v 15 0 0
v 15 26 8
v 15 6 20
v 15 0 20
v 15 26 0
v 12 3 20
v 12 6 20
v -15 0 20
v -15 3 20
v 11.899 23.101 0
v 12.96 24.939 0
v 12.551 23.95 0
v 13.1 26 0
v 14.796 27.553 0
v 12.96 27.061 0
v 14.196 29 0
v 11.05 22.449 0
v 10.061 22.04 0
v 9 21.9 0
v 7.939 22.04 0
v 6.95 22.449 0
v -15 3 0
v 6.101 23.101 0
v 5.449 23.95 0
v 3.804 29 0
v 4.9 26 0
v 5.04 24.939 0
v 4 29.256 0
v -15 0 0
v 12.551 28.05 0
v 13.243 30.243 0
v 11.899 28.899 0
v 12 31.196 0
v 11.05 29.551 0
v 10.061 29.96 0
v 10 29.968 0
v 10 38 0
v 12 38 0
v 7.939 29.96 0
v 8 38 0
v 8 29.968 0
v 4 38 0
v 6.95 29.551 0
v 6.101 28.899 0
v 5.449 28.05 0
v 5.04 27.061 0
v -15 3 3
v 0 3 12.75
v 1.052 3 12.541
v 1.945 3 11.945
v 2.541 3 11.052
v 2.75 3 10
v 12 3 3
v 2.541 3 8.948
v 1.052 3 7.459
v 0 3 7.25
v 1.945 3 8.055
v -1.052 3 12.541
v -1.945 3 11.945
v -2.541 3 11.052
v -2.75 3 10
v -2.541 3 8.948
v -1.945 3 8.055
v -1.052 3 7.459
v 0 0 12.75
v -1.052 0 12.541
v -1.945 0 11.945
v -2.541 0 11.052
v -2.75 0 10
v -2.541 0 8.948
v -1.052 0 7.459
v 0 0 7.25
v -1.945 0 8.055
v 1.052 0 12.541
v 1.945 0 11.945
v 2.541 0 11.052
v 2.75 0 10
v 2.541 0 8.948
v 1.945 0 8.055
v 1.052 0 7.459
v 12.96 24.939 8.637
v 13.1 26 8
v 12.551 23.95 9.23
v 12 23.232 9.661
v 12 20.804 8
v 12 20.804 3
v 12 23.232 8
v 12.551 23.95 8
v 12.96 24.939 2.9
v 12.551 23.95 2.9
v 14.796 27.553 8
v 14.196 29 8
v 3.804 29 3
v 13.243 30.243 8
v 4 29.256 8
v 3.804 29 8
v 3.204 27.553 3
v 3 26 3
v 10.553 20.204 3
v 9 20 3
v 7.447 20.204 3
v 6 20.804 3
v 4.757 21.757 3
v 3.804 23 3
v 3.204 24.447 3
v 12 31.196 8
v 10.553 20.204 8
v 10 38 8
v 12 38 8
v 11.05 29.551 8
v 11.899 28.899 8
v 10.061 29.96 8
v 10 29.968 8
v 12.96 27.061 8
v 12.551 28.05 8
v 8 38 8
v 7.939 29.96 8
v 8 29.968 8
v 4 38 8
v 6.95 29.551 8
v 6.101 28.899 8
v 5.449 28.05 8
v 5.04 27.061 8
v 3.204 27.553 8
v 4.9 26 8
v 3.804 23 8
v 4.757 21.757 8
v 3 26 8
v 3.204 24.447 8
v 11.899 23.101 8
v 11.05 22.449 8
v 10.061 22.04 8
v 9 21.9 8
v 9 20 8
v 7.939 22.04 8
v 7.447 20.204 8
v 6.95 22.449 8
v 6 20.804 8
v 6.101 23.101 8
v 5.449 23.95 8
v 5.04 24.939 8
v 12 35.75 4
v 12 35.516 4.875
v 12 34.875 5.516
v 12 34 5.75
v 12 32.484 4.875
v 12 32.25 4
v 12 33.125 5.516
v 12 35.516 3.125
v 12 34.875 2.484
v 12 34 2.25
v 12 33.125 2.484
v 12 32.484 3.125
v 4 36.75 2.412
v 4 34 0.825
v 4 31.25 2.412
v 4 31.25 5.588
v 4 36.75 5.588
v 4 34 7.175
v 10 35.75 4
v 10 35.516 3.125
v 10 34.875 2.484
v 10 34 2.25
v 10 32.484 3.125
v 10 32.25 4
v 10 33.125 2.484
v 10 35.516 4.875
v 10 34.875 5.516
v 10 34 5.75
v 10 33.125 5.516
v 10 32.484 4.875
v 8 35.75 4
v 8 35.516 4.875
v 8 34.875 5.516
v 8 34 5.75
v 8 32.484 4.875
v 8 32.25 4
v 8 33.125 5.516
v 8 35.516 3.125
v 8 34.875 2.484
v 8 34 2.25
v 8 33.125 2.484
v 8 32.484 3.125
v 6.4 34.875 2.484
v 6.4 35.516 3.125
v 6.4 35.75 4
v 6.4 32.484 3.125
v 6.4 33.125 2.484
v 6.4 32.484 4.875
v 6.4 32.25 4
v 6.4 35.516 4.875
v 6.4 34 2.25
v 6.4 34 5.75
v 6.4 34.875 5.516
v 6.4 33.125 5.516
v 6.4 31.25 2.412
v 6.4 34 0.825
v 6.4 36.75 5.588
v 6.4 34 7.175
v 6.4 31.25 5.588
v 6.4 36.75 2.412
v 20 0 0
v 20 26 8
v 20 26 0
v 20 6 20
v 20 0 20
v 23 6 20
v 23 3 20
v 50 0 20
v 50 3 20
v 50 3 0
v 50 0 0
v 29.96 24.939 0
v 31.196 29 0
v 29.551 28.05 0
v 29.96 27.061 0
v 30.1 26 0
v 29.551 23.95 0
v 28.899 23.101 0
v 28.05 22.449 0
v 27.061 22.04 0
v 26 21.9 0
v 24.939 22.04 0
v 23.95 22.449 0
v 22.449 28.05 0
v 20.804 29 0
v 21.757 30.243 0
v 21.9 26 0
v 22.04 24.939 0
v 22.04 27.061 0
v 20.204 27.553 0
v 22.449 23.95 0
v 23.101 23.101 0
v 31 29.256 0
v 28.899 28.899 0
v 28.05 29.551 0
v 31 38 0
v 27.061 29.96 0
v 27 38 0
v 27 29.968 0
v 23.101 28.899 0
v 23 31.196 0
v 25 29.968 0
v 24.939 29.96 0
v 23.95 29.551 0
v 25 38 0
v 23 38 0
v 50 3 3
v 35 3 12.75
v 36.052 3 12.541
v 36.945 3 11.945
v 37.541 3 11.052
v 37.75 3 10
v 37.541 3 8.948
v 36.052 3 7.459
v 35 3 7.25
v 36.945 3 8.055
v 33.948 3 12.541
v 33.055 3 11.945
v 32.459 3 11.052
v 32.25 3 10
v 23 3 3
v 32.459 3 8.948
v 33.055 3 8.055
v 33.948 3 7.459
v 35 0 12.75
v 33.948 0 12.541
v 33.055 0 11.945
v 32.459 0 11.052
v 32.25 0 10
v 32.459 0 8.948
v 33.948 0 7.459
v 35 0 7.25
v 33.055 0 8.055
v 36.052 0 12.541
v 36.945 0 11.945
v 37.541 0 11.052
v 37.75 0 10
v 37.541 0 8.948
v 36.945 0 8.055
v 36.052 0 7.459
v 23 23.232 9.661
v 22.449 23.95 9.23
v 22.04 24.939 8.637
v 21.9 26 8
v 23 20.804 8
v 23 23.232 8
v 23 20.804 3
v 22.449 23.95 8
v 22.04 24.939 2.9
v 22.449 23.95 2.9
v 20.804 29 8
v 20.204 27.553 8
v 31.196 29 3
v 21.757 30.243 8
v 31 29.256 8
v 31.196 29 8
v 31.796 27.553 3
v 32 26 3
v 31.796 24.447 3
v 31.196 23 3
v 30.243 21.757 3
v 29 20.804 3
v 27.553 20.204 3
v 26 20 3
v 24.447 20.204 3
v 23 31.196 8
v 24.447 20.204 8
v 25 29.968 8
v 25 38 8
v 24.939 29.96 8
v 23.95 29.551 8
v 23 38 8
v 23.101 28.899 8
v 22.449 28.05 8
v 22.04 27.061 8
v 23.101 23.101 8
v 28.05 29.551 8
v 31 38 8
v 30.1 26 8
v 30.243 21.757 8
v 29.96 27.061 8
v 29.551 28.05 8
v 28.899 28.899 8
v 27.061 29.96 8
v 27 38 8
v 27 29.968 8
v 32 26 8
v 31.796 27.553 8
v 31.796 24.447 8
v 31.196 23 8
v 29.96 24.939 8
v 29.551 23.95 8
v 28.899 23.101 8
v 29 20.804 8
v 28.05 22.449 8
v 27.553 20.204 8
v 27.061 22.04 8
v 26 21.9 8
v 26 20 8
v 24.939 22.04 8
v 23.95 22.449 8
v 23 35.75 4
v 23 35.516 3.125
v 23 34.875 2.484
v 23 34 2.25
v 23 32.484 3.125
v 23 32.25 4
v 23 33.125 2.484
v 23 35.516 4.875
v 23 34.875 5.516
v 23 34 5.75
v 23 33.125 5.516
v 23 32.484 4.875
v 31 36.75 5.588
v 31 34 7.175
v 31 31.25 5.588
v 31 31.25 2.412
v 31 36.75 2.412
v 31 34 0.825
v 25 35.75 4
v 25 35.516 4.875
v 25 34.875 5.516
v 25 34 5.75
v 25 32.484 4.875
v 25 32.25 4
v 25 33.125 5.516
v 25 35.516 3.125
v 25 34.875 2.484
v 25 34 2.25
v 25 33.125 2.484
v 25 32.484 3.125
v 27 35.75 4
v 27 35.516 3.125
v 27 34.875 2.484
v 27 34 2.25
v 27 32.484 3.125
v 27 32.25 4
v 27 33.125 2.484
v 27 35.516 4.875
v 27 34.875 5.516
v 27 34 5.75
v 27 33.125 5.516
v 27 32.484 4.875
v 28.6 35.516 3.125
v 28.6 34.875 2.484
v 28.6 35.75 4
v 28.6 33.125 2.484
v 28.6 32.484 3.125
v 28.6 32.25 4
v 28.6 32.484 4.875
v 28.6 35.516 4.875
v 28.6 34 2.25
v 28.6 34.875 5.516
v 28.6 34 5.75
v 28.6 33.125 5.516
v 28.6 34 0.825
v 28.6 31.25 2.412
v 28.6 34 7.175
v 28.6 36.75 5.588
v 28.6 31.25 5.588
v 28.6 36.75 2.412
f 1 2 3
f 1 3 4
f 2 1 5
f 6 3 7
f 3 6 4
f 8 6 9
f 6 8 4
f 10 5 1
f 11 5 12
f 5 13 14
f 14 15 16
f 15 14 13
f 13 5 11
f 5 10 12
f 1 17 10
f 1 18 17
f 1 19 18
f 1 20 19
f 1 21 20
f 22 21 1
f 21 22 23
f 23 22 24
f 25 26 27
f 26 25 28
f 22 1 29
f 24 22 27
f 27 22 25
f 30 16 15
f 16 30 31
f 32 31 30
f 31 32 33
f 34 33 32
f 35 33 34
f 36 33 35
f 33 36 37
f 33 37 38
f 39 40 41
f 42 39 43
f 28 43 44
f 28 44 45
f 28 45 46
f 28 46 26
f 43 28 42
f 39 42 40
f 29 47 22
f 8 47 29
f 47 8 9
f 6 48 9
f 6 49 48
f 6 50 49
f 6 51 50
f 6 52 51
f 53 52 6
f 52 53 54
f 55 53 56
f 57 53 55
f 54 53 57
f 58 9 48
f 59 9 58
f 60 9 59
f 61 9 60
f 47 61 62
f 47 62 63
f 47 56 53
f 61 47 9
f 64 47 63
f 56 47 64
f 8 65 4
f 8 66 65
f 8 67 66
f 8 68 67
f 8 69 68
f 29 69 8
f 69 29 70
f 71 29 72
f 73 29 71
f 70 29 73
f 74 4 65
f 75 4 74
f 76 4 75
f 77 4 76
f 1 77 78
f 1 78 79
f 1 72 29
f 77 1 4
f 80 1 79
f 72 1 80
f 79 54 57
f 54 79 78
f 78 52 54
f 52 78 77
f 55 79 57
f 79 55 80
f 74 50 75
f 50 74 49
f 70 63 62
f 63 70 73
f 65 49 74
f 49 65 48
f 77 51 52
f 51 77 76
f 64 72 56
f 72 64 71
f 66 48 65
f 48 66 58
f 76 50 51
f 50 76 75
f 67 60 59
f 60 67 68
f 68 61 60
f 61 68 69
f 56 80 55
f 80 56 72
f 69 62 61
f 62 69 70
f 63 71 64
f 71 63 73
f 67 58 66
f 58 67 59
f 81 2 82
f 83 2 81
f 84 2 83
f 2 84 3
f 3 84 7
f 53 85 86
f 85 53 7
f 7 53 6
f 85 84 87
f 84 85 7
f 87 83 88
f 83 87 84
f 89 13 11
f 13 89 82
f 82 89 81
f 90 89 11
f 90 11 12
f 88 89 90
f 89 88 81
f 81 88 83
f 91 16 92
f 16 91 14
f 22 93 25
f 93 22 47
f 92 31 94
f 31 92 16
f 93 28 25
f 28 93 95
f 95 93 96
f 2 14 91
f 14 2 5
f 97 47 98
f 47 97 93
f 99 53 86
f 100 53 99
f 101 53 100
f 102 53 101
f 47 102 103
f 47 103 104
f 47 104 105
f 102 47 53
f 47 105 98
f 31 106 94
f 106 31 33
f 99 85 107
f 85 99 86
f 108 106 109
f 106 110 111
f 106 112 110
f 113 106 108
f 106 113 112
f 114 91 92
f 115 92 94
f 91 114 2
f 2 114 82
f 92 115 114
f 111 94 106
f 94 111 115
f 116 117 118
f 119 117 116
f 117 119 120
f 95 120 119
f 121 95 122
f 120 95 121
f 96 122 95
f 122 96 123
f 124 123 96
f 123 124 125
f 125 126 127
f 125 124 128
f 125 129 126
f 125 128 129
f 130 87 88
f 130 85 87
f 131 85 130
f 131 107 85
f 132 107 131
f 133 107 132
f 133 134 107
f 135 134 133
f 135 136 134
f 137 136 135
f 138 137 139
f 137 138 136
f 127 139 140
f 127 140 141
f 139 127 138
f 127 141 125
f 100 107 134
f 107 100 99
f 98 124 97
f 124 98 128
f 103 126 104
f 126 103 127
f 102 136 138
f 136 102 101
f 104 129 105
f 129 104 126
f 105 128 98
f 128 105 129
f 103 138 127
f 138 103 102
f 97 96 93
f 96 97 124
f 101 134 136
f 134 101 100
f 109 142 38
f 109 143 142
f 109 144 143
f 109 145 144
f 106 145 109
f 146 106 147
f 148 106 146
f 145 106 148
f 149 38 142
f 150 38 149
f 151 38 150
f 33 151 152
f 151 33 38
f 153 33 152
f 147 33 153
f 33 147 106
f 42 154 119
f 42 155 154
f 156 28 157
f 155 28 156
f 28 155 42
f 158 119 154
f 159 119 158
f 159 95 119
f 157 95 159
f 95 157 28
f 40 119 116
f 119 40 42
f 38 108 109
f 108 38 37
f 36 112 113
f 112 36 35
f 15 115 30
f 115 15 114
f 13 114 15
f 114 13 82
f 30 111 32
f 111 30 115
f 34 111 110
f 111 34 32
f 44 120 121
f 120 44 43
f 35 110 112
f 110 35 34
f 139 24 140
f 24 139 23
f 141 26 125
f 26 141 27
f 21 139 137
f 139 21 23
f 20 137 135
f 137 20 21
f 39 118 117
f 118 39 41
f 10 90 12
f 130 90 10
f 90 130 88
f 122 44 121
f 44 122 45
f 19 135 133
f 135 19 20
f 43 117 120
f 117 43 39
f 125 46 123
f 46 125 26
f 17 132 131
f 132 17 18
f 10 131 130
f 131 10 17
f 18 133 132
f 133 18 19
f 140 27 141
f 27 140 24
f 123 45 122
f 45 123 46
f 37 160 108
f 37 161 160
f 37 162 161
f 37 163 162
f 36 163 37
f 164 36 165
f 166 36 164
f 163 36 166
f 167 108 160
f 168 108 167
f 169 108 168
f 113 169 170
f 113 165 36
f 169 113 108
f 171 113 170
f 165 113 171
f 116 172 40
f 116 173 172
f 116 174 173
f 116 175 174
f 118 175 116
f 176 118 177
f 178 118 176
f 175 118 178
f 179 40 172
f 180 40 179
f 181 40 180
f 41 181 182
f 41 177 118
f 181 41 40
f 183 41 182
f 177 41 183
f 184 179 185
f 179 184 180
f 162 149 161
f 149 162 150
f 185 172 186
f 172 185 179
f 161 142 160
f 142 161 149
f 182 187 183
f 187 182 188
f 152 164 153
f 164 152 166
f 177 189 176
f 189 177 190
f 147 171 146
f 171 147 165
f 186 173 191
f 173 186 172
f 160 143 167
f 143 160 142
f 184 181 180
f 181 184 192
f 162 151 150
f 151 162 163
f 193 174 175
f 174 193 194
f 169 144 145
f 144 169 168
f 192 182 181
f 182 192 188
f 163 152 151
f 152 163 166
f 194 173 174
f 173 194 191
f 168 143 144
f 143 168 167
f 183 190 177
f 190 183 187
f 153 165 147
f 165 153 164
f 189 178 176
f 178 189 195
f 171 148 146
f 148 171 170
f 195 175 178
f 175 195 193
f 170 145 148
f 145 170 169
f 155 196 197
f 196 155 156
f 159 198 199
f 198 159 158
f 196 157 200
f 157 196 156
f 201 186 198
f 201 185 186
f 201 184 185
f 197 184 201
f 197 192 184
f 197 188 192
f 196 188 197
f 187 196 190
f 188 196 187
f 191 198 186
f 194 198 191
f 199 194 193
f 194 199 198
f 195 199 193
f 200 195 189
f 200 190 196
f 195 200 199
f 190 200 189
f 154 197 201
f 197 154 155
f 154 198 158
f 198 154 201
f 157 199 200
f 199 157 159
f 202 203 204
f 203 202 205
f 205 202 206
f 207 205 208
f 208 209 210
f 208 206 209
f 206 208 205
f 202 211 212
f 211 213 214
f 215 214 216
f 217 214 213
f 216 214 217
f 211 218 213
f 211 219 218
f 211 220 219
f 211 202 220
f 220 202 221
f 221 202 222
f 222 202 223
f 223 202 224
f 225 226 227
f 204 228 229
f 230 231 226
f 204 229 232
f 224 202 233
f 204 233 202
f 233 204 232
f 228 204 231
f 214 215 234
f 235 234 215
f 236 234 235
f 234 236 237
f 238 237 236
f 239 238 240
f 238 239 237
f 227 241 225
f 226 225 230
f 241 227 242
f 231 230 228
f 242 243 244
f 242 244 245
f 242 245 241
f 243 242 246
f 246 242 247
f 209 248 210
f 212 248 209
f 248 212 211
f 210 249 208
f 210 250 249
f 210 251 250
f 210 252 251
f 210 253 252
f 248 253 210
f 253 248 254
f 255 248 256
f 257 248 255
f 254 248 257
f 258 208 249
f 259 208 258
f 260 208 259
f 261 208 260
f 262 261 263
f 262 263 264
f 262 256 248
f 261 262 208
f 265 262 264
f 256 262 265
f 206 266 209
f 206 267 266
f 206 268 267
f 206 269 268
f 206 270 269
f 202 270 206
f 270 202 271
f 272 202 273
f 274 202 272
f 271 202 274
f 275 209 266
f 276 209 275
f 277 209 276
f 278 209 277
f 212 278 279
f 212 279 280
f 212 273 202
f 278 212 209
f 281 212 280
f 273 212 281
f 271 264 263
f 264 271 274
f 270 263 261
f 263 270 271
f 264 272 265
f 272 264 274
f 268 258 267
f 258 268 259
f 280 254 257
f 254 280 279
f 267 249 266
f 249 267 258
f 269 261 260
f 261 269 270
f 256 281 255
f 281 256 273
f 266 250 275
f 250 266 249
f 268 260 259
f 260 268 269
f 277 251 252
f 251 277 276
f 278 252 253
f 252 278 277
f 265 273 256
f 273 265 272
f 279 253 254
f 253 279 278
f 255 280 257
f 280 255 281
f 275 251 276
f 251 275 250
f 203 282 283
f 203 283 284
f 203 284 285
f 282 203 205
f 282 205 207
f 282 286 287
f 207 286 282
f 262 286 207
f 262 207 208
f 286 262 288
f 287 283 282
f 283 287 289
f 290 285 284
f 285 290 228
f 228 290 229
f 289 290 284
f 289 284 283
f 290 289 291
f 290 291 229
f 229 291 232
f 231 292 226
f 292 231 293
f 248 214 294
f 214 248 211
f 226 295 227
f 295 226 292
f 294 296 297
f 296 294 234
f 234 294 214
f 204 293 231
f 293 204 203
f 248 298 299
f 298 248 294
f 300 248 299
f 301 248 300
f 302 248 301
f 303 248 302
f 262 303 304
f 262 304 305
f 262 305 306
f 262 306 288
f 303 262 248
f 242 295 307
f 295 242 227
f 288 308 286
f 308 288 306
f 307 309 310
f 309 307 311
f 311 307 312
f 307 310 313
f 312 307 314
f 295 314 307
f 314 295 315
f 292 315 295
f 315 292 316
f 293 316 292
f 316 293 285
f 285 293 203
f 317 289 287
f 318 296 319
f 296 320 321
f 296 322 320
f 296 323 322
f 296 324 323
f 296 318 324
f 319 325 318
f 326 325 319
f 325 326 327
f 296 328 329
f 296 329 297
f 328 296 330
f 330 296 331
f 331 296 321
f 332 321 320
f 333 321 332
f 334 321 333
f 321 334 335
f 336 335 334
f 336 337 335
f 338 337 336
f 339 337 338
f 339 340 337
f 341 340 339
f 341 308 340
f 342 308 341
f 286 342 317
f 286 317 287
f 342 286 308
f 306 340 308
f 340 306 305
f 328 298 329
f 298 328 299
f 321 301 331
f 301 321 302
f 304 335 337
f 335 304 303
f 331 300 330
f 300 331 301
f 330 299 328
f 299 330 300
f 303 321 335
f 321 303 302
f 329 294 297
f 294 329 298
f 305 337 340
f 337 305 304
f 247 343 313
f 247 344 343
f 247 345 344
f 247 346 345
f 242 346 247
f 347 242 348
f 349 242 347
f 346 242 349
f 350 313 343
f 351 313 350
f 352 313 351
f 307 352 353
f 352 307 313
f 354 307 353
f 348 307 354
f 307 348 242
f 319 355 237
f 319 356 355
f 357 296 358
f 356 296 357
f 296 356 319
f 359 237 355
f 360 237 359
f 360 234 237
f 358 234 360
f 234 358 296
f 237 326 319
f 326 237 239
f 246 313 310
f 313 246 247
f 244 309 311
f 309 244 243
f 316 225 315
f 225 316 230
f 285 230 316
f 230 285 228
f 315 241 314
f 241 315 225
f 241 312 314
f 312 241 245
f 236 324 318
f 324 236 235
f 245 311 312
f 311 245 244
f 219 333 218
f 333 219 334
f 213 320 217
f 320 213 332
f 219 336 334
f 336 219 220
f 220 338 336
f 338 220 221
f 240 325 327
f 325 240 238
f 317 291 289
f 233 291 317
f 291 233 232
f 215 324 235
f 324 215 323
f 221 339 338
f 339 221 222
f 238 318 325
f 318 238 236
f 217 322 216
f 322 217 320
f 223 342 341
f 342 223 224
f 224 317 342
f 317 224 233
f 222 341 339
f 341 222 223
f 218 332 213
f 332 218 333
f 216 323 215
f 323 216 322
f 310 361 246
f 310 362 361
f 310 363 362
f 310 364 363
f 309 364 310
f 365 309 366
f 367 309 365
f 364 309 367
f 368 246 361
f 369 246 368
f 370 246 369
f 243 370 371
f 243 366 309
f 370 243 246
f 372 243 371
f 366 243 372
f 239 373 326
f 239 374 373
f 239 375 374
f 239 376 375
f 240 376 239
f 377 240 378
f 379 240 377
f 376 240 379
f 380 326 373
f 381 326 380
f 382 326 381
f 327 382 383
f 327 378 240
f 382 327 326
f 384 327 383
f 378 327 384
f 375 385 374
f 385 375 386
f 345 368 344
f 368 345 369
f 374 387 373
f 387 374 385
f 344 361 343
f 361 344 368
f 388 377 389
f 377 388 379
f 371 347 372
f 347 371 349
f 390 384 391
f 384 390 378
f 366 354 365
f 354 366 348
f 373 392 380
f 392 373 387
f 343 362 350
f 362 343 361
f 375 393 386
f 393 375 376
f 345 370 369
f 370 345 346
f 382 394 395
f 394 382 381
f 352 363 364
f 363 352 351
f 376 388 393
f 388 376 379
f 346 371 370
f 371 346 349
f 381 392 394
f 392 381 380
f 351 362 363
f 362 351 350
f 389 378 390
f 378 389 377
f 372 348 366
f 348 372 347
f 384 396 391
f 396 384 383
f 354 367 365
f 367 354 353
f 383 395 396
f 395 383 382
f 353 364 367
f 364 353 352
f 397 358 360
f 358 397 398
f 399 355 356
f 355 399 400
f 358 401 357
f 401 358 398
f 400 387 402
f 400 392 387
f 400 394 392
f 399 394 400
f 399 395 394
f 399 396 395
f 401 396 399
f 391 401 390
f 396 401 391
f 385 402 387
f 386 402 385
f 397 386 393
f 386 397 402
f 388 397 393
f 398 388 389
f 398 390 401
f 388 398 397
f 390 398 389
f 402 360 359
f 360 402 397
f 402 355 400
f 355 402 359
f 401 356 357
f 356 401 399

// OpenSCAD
// file: modules.scad
// Fonctions personnalisées

//http://forum.openscad.org/Wish-mirror-copy-true-td10681.html
module copy_mirror(vec=[0,1,0])
{
    children();
    mirror(vec) children();
}

module ecrou(plat,h){
  cylinder(d=plat*2/sqrt(3), h=h, $fn=6);
}


module courroie(diam,longueur){
  color ("black")
  difference(){
    hull(){
      cylinder(d=diam+1, h=6, $fn=32);
      translate([longueur,0,0]) cylinder(d=diam+1, h=6, $fn=32);
    }
    translate([0,0,-1])
    hull(){
      cylinder(d=diam-1, h=8, $fn=32);
      translate([longueur,0,0]) cylinder(d=diam-1, h=8, $fn=32);
    }
  }
  
  
}
// file: config.scad
// Paramètres de la machine

decal=-30;            // décallage du chassis xz
hauteur=400;          // hauteur totale chassis
largeur=400;          // largeur totale chassis
longueur=470;         // longueur totale chassis
hauteur_base=90;      // hauteur de la base
entraxe_y=140;        // distance entre les tiges Ø8 axe Y
entraxe_x=45;         // distance entre les tiges Ø8 axe X

couleur=[1,0.6,0];


// Plats écrous
ec3=5.7;
ec4=7.2;
ec5=8.2;
ec6=10.2;

// Jeu sur plats pour les écrous glissants
jec=0.2;

// hauteur écrous
ec3h=2.4;
ec4h=3.2;
ec5h=4.7;
ec6h=5.2;

// Vis
vis3=3.5;
vis4=4.5;
vis5=5.5;
vis6=6.5;


// Paramètre des pièces et jeux

// écart plateau/courroie
// y_belt_holder
belt_h=13;      // écart entre la courroie et le plateau

// écart plateau/tiges lisses
// y_lm8uu
decal_plateau=12; // Décallage en Y

// décallage des tiges lisses Y
// support_tige8_y
decal_tiges=5;

// décallage moteur Y
// y_motor
decal_motory_z=11;
decal_motory_y=25;

// Equerres de fixation position fermée
eq_ec=10;      // écart entre profilés

// Fixations axe Z
pos_z=26;      // position des axes par rapport au profilé (>= 21)
hauteur_z=20;  // hauteur des fixations
entraxe_z=17;  // distance entre les tiges Ø8 et M5
// est ce que la tige de 8 dépasse du profilé de 30?
// si oui, on décale les fixations
decalx=max(-42/2+entraxe_z+8/2+2, 0);

// Roulements linéaires
lbd = 15; // diamètre ext
lbh = 24; // hauteur

// x_carriage
he_x=23;  // entraxe hotend x
he_y=23;  // entraxe hotend y
sen_x=20; // entraxe capteur x
sen_y=23; // entraxe capteur y

// sensor_holder
sen_ep=3;   // épaisseur
sen_d=12.5; // diamètre du capteur
sen_pos=0;  // décentrage en x du capteur
sen_z=7;    // position Z de la bague

// y_belt_idler
ybi_ep1=4;       // épaisseur de la partie fixe
ybi_ep2=4;       // épaisseur de la partie mobile
ybi_h=16;        // position de l'axe
ybi_ec=11;       // écart pour le passage du ou des roulement
ybi_vis=vis4;    // diamètre passage de vis (axe)
ybi_ecrou=ec4;   // plat écrou
ybi_ecrouh=ec4h; // hauteur écrou
ybi_long=60;     // longueur de la partie mobile entre axes
ybi_prof=15;     // largeur de la partie mobile


// nombre de dents des poulies
poulie=20;

// Pas des courroies
pas=2;

// diamètre des poulies
dpoulie=poulie*pas/3.1416;
// main file
// eLKa1
// z_axis_top
// GNU GPL v3
// lkiefer <blog.lkiefer.org> and contributors
// http://www.reprap.org/wiki/ELKa
// https://github.com/kimented/elka1

include <config.scad>;
use <modules.scad>;

module z_axis_top_l(){
  ep=3;
  
  color(couleur) translate([-42/2+30/2,pos_z,0]){
    // fixation face
    difference(){
      translate([-(30-42/2),-pos_z,0]) cube([30,ep,hauteur_z]);
      translate([42/2-30/2, -pos_z-1,hauteur_z/2]) rotate([-90,0,0]) cylinder(h=ep+2, d=vis5, $fn=16);
    }
    // fixation coté
    /*difference(){
      translate([42/2-30,-pos_z-30,0]) cube([ep,30,hauteur_z]);
      translate([42/2-30-1,-pos_z-30/2,hauteur_z/2]) rotate([0,90,0]) cylinder(d=vis5, h=ep+2, $fn=16);}*/
    // nervure
    translate([42/2-ep,0,0])
    difference(){
      hull(){
        translate([0,-1,0]) cube([ep,1,ep+5]);
        translate([0,-pos_z+ep,0]) cube([ep,ep,hauteur_z]);
      }
      translate([-1,-pos_z-1,-1.1]) cube([ep+2, 42/2+pos_z+2, ep+1]);
      // trou tige
      translate([-42/2+ep+entraxe_z-decalx,0,-1]) cylinder(d=8.2, h=hauteur_z+2, $fn=24);
    }
    // tige 8
    translate([entraxe_z,0,0]){
      difference(){
        union(){
          hull(){
            translate([-decalx,0,0]) cylinder(d=8+2*2, h=ep, $fn=24);
            translate([-(30-42/2)-entraxe_z,-pos_z,0]) cube([30,ep,ep]);
          }
          translate([-decalx,0,0]) cylinder(d=8+2*2, h=8, $fn=24);
          translate([-5-decalx,0,0]) cube([8,8/2+8,ep+5],convexity=15);
        }
        // trou tige
        translate([-decalx,0,-1]) cylinder(d=8.2, h=8+2, $fn=24);
        // rainure
        translate([-1-decalx,-1,-1]) cube([2,8/2+8+2,ep+5+2]);
        // vis
        translate([-10-decalx,8,4]) rotate([0,90,0]) cylinder(h=20, d=vis3, $fn=12);
        translate([-5+-1-decalx,8,4]) rotate([0,90,0]) ecrou(5.5, ec3h+1);
      }
    }
  }
}

module z_axis_top_r(){
  mirror([1,0,0]) z_axis_top_l();
}

z_axis_top_l();
translate([35,0,0]) z_axis_top_r();
